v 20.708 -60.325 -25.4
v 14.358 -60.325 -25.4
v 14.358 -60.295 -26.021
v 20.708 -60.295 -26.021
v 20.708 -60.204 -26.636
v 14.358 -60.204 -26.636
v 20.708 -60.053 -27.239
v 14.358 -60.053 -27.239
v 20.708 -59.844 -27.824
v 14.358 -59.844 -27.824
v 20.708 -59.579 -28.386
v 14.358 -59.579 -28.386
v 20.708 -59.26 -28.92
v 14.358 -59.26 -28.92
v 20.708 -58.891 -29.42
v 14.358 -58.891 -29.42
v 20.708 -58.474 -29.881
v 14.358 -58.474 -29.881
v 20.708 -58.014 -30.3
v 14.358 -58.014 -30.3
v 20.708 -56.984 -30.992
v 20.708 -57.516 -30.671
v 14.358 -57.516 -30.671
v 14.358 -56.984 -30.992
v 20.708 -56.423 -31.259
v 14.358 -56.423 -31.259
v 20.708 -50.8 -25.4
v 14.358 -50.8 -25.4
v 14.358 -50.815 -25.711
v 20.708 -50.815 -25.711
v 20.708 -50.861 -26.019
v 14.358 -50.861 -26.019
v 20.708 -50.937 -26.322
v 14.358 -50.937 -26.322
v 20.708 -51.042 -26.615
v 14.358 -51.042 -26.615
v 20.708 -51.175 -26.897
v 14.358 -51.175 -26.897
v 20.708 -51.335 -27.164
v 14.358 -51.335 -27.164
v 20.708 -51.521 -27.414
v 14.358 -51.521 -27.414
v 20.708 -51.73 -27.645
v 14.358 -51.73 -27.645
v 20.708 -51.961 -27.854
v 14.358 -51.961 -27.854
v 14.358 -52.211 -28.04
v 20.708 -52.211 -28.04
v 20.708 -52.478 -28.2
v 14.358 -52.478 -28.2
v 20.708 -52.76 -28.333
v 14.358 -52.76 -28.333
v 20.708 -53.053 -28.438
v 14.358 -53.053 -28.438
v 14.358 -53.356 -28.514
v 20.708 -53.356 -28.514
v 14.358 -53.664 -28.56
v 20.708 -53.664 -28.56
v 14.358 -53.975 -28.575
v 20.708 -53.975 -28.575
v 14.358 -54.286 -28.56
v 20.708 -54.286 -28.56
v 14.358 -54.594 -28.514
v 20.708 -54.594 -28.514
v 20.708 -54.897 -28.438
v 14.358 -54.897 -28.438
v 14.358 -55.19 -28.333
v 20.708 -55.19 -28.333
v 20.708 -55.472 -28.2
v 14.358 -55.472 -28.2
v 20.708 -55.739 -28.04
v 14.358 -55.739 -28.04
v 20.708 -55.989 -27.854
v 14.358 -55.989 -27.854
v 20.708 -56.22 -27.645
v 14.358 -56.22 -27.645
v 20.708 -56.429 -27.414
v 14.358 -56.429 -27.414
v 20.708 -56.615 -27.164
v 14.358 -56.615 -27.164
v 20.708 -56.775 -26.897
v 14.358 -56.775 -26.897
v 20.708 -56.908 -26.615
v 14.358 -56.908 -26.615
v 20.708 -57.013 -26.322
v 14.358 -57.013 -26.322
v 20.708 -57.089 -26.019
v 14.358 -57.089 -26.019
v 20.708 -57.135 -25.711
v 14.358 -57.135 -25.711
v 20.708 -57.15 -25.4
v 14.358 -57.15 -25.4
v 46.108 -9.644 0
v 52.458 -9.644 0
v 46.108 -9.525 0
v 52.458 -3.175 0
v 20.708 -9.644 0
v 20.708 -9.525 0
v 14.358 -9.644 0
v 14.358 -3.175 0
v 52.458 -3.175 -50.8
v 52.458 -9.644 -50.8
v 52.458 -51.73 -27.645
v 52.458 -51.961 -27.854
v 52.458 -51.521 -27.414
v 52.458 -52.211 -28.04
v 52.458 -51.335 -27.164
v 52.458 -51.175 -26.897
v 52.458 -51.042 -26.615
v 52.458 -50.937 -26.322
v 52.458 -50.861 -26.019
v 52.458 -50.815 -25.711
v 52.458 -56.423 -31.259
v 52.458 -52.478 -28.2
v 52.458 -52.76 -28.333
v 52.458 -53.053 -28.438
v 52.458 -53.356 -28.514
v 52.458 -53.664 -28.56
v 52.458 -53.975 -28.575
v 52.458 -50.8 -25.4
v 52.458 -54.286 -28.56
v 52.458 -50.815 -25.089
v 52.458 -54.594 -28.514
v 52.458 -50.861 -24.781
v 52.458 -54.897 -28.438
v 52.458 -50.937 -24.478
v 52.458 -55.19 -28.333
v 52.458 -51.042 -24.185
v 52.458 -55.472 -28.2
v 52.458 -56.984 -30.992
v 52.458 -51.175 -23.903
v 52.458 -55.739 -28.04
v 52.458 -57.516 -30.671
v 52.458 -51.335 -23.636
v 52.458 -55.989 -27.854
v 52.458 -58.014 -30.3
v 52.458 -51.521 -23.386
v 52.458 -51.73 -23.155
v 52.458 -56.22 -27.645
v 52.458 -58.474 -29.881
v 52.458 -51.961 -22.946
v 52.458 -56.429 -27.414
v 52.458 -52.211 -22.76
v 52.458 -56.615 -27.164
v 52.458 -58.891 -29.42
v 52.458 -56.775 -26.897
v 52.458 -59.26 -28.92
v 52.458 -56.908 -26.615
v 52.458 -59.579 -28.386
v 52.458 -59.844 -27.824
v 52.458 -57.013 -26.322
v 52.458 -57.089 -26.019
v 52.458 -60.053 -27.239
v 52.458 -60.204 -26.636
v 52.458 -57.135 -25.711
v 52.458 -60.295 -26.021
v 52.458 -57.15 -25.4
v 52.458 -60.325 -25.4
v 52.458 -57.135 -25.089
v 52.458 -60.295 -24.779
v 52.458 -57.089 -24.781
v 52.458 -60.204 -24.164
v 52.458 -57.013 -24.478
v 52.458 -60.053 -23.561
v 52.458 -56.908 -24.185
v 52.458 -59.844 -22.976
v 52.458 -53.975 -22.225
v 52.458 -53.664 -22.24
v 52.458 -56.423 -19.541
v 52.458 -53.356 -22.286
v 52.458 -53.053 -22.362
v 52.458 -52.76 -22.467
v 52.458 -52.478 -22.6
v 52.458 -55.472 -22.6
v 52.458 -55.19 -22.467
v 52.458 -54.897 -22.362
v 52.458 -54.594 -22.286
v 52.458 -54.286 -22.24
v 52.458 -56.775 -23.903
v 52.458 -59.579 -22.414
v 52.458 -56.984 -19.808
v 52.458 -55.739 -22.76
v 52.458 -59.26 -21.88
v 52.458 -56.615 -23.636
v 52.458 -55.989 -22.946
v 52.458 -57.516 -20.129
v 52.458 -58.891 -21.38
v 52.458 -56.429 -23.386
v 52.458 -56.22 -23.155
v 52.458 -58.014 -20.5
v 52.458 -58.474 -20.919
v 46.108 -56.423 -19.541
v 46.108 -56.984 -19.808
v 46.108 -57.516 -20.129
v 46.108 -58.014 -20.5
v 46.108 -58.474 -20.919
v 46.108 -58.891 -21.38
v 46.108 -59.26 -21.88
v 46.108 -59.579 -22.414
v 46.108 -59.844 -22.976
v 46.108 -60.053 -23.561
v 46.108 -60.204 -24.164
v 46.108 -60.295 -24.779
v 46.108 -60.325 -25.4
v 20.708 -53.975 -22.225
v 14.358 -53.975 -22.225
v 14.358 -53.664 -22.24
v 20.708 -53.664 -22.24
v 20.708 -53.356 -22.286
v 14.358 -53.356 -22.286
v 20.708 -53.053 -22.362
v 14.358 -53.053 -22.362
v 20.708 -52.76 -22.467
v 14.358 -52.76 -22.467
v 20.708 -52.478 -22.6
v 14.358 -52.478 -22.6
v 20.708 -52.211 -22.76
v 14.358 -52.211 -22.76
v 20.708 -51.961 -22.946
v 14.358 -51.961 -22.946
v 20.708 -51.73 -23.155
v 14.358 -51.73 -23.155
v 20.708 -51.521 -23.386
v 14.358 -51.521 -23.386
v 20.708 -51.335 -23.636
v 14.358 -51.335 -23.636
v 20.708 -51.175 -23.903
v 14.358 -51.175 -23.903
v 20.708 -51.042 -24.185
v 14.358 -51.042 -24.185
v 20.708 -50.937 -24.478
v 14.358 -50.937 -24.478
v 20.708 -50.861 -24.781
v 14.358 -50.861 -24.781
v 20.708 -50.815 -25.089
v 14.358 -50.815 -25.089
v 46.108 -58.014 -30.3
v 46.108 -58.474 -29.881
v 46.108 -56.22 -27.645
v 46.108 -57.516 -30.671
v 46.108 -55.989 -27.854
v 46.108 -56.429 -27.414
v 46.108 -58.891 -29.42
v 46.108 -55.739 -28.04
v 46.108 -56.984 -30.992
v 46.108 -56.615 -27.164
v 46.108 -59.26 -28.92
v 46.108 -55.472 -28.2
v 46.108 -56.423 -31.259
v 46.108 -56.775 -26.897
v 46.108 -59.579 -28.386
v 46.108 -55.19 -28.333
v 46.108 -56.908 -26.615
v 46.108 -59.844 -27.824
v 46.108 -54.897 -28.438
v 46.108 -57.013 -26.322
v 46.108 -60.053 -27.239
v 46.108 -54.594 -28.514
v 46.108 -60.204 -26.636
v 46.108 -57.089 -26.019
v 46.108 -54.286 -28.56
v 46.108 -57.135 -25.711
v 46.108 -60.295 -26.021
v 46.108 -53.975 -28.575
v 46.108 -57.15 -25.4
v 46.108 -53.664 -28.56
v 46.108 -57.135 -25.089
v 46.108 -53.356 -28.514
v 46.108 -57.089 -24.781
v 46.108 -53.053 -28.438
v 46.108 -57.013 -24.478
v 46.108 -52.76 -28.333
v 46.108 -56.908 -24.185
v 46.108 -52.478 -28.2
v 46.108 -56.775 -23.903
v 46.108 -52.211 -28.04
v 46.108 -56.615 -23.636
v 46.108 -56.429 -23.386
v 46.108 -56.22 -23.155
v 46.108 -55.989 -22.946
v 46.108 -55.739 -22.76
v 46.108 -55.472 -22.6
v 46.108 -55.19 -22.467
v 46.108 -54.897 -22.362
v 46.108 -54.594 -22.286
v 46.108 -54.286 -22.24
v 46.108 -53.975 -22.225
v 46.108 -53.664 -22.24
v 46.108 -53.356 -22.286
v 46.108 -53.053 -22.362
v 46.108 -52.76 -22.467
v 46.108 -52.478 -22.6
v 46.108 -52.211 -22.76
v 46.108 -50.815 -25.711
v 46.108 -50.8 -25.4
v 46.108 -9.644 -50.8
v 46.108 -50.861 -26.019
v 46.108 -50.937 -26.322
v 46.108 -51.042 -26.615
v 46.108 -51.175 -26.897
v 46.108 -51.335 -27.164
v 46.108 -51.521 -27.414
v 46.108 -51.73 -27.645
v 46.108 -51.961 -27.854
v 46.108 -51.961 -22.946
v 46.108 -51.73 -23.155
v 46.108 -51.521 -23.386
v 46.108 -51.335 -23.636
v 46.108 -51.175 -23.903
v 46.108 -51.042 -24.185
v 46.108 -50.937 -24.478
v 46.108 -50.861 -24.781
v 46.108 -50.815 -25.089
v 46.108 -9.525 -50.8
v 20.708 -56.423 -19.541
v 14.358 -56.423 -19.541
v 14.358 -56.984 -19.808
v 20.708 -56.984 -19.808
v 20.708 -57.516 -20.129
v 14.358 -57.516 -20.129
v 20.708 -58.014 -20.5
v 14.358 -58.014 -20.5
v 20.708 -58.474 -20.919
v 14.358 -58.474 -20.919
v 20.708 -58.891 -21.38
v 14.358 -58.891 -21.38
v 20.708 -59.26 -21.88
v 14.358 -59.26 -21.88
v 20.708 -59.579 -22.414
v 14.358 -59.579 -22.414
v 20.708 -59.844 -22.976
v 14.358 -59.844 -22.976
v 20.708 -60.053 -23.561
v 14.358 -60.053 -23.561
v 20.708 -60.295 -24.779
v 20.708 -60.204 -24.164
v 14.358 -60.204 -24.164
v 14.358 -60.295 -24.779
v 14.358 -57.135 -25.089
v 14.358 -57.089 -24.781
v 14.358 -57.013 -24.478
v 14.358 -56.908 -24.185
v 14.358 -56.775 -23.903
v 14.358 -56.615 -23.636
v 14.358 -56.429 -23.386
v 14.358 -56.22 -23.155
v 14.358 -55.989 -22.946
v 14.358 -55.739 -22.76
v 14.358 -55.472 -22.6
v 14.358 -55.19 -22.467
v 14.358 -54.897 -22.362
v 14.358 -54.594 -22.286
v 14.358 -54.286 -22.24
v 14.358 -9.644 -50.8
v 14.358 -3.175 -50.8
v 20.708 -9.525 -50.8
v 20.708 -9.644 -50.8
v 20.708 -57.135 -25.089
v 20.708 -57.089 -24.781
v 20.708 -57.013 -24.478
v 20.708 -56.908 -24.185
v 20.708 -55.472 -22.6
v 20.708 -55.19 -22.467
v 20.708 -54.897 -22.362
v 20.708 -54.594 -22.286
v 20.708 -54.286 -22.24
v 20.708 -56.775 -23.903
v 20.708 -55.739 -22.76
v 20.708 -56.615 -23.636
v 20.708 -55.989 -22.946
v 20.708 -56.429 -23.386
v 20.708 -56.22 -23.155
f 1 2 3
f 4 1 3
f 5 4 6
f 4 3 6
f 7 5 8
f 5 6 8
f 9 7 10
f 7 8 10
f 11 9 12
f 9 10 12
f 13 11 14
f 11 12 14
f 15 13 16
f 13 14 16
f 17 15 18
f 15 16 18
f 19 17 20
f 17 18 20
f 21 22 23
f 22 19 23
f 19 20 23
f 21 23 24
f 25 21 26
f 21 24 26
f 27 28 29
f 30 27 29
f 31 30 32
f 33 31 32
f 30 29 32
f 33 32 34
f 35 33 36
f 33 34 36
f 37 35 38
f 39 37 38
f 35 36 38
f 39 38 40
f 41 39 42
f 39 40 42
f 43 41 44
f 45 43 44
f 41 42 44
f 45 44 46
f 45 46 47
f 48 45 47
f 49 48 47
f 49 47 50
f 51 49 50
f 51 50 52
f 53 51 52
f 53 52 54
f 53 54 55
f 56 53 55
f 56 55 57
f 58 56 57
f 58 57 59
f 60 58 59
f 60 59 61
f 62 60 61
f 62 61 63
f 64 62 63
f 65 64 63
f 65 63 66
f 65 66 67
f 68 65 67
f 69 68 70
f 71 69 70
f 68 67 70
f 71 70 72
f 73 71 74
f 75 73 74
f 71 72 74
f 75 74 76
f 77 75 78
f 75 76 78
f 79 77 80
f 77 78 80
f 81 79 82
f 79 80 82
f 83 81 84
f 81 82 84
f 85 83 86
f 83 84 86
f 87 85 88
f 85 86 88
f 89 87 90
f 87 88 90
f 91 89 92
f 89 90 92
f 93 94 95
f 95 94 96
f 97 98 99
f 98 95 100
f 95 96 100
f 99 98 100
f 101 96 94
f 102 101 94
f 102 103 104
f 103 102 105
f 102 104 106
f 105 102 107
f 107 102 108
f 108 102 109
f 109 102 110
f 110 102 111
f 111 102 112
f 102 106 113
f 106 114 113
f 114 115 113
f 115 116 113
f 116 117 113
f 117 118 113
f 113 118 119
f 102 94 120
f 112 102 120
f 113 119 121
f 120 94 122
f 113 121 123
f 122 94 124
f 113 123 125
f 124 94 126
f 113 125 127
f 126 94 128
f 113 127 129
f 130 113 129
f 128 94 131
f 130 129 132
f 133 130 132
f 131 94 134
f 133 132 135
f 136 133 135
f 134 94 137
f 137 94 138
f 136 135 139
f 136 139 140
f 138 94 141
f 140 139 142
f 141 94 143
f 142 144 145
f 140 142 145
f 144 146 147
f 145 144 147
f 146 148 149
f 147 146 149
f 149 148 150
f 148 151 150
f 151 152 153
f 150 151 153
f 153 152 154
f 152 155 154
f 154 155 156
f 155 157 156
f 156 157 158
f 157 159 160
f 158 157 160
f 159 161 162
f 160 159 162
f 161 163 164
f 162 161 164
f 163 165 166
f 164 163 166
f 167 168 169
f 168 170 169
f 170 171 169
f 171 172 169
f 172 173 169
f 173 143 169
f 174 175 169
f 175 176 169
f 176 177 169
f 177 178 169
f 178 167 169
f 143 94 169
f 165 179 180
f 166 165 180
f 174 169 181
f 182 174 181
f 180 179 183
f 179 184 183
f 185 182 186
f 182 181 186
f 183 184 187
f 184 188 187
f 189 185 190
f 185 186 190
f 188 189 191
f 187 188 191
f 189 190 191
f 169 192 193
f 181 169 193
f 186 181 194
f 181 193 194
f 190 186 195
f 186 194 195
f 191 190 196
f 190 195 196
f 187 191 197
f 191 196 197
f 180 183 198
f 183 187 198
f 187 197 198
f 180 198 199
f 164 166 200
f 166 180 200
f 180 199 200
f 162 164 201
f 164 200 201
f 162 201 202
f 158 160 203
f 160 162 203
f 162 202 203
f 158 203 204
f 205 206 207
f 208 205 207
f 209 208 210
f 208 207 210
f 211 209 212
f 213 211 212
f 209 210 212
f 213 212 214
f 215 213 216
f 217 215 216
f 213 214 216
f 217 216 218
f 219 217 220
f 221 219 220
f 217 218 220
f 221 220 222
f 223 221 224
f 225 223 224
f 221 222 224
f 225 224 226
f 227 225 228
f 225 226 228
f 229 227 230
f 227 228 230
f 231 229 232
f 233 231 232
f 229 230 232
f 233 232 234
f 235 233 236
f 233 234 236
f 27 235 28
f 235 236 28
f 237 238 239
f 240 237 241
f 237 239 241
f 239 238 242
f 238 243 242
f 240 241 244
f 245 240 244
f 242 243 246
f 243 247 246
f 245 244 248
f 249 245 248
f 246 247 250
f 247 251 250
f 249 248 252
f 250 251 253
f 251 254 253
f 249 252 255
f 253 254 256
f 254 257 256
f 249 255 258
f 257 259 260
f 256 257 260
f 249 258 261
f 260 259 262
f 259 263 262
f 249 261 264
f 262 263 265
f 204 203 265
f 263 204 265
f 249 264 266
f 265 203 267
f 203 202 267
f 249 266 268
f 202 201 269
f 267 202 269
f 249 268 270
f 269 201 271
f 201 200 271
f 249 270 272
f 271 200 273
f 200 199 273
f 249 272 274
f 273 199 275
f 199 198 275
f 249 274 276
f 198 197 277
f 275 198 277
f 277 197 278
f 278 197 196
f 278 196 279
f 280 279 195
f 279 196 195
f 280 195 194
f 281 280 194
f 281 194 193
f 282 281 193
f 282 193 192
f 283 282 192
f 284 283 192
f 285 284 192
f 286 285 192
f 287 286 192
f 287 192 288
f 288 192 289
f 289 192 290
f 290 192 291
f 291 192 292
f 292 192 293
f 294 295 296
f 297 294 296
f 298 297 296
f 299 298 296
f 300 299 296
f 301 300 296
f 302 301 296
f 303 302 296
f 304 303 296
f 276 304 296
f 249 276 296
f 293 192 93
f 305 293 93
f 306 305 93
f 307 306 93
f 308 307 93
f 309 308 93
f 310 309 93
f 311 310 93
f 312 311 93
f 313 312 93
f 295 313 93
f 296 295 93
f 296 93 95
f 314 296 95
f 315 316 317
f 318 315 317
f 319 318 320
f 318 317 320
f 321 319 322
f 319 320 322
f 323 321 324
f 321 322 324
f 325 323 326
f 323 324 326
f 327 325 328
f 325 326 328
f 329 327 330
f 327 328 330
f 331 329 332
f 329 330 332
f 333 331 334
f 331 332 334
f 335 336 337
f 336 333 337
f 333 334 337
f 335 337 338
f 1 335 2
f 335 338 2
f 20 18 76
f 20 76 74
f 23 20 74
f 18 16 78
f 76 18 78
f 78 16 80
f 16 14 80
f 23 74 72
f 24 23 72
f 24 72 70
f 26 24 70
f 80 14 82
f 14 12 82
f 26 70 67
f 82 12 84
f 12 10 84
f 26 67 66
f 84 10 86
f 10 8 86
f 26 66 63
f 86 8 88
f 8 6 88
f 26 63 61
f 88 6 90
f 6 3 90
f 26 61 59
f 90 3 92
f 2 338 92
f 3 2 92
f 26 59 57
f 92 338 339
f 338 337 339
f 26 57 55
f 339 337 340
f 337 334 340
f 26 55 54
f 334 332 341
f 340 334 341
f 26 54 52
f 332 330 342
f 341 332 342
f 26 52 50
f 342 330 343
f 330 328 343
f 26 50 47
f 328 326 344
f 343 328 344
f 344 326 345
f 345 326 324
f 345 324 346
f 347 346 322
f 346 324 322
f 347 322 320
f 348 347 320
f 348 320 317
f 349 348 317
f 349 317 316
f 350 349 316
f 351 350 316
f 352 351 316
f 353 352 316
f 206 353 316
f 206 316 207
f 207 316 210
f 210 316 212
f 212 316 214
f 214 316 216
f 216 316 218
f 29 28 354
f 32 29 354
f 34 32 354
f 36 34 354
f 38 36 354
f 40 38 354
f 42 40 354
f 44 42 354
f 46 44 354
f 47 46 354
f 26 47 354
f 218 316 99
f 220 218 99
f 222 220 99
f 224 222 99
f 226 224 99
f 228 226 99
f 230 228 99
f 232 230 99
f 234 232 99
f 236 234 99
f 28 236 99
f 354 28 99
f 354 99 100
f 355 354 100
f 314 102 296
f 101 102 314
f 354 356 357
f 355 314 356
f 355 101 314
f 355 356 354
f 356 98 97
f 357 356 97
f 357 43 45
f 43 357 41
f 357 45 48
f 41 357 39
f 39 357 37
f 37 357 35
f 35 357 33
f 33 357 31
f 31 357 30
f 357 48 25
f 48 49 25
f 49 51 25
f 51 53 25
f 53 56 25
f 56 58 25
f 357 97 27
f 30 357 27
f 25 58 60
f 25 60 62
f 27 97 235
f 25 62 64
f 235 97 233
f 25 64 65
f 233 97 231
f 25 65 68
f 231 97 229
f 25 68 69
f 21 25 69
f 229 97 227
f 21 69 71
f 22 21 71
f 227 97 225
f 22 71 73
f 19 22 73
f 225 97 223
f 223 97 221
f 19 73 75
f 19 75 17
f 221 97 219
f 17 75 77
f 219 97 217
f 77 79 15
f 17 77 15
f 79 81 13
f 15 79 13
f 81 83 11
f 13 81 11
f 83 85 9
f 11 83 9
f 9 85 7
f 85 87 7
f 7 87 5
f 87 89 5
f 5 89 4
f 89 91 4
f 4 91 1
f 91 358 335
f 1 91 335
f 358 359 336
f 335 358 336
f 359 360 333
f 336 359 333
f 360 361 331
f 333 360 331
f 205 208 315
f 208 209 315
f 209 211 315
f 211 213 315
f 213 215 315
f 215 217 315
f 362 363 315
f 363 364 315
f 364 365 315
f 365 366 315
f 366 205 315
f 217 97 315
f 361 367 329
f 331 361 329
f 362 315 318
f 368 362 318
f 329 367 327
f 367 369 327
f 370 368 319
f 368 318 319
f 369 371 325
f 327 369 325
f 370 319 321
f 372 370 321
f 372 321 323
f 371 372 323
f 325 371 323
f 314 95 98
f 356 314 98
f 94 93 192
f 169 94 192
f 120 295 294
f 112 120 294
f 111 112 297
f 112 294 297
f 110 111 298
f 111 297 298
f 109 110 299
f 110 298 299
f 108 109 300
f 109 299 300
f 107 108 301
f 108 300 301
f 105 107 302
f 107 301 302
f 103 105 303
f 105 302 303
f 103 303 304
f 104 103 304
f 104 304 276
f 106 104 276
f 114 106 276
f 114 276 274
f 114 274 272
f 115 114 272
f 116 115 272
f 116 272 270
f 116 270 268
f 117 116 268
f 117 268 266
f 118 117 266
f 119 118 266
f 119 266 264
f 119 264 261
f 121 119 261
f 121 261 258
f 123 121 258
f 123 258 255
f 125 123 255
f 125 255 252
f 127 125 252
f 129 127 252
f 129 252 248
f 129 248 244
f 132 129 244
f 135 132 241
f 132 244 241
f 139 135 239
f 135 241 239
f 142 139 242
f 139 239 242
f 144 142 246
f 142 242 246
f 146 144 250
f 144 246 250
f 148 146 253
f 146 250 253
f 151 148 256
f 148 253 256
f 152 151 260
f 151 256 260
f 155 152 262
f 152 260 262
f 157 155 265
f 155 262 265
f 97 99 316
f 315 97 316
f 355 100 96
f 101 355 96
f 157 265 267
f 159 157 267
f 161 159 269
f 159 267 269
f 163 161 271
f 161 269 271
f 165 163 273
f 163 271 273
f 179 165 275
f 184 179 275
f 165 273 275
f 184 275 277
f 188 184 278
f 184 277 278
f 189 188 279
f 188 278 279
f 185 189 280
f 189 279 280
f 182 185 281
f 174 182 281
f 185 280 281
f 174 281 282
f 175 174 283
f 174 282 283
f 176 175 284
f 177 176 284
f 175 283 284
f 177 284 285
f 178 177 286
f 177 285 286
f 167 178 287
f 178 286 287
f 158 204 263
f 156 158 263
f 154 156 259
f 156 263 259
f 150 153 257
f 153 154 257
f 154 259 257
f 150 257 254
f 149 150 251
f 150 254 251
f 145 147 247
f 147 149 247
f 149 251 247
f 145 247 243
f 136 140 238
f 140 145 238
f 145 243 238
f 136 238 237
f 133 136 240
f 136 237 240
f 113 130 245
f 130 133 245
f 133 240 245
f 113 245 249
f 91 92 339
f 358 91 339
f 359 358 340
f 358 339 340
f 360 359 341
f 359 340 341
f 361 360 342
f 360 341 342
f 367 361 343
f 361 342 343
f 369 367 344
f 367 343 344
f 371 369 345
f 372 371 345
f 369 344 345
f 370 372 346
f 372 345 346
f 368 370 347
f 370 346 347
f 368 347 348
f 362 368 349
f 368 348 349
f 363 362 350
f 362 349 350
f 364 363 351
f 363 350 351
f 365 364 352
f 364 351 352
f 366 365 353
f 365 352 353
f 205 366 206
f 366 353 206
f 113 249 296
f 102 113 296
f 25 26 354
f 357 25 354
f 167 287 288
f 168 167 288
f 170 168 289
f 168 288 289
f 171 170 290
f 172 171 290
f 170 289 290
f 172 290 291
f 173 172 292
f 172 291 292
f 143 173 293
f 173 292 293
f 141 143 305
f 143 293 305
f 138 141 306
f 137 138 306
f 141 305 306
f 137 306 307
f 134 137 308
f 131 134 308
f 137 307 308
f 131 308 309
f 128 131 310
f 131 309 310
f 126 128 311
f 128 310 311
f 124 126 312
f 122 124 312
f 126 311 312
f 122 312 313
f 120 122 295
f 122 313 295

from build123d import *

# Parameters (mm, degrees)
BOSS_EXTRUDE1_DEPTH = 50.8
CUT_EXTRUDE1_REACH  = 89.586


with BuildPart() as part:
    # Sketch1 → Boss-Extrude1 (new body)
    with BuildSketch(Plane.XY):
        Polygon((52.45808334, -3.175), (52.45808334, -60.325), (46.10808334, -60.325), (46.10808334, -9.525), (20.70808334, -9.525), (20.70808334, -60.325), (14.35808334, -60.325), (14.35808334, -3.175), align=None)
    extrude(amount=-BOSS_EXTRUDE1_DEPTH)

    # Cut-Extrude1: up to this face of the body (flat: up to its plane)
    cut_extrude1_end = Plane(part.part.faces().sort_by_distance((52.45808334, -31.75, -25.4))[0])
    # Sketch2 → Cut-Extrude1 (cut, up to the picked face)
    with BuildSketch(Plane.ZY.offset(-14.35808334), mode=Mode.PRIVATE) as cut_extrude1_sk1:
        with BuildLine():
            ThreePointArc((-22.225, -53.975), (-23.15493597, -51.72993597), (-25.4, -50.8))
            Line((-25.4, -50.8), (-25.4, -57.15))
            ThreePointArc((-25.4, -57.15), (-23.15493597, -56.22006403), (-22.225, -53.975))
        make_face()
    cut_extrude1_tool1 = split(extrude(cut_extrude1_sk1.sketch, amount=-CUT_EXTRUDE1_REACH, mode=Mode.PRIVATE), bisect_by=cut_extrude1_end, keep=Keep.BOTH, mode=Mode.PRIVATE)
    # Sketch2 → Cut-Extrude1 (cut, up to the picked face)
    with BuildSketch(Plane.ZY.offset(-14.35808334), mode=Mode.PRIVATE) as cut_extrude1_sk2:
        with BuildLine():
            Line((-25.4, -57.15), (-25.4, -50.8))
            ThreePointArc((-25.4, -50.8), (-28.575, -53.975), (-25.4, -57.15))
        make_face()
    cut_extrude1_tool2 = split(extrude(cut_extrude1_sk2.sketch, amount=-CUT_EXTRUDE1_REACH, mode=Mode.PRIVATE), bisect_by=cut_extrude1_end, keep=Keep.BOTH, mode=Mode.PRIVATE)
    # Sketch2 → Cut-Extrude1 (cut, up to the picked face)
    with BuildSketch(Plane.ZY.offset(-14.35808334), mode=Mode.PRIVATE) as cut_extrude1_sk3:
        with BuildLine():
            ThreePointArc((-22.225, -53.975), (-23.15493597, -51.72993597), (-25.4, -50.8))
            Line((-25.4, -50.8), (-25.4, -57.15))
            ThreePointArc((-25.4, -57.15), (-23.15493597, -56.22006403), (-22.225, -53.975))
        make_face()
    cut_extrude1_tool3 = split(extrude(cut_extrude1_sk3.sketch, amount=-CUT_EXTRUDE1_REACH, mode=Mode.PRIVATE), bisect_by=cut_extrude1_end, keep=Keep.BOTH, mode=Mode.PRIVATE)
    # Sketch2 → Cut-Extrude1 (cut, up to the picked face)
    with BuildSketch(Plane.ZY.offset(-14.35808334), mode=Mode.PRIVATE) as cut_extrude1_sk4:
        with BuildLine():
            Line((-25.4, -57.15), (-25.4, -50.8))
            ThreePointArc((-25.4, -50.8), (-28.575, -53.975), (-25.4, -57.15))
        make_face()
    cut_extrude1_tool4 = split(extrude(cut_extrude1_sk4.sketch, amount=-CUT_EXTRUDE1_REACH, mode=Mode.PRIVATE), bisect_by=cut_extrude1_end, keep=Keep.BOTH, mode=Mode.PRIVATE)
    # Sketch2 → Cut-Extrude1 (cut, up to the picked face)
    with BuildSketch(Plane.ZY.offset(-14.35808334), mode=Mode.PRIVATE) as cut_extrude1_sk5:
        with BuildLine():
            Line((0, -9.643805147), (-19.540665388, -56.422590224))
            ThreePointArc((-19.540665388, -56.422590224), (-21.880035364, -59.260106334), (-25.4, -60.325))
            Line((-25.4, -60.325), (0, -60.325))
            Line((0, -60.325), (0, -9.643805147))
        make_face()
    cut_extrude1_tool5 = split(extrude(cut_extrude1_sk5.sketch, amount=-CUT_EXTRUDE1_REACH, mode=Mode.PRIVATE), bisect_by=cut_extrude1_end, keep=Keep.BOTH, mode=Mode.PRIVATE)
    # Sketch2 → Cut-Extrude1 (cut, up to the picked face)
    with BuildSketch(Plane.ZY.offset(-14.35808334), mode=Mode.PRIVATE) as cut_extrude1_sk6:
        with BuildLine():
            ThreePointArc((-25.4, -60.325), (-28.919964636, -59.260106334), (-31.259334612, -56.422590224))
            Line((-31.259334612, -56.422590224), (-50.8, -9.643805147))
            Line((-50.8, -9.643805147), (-50.8, -60.325))
            Line((-50.8, -60.325), (-25.4, -60.325))
        make_face()
    cut_extrude1_tool6 = split(extrude(cut_extrude1_sk6.sketch, amount=-CUT_EXTRUDE1_REACH, mode=Mode.PRIVATE), bisect_by=cut_extrude1_end, keep=Keep.BOTH, mode=Mode.PRIVATE)
    add(cut_extrude1_tool1.solids().sort_by(Axis((14.358083, -53.975, -24.052488), (1, 0, 0)))[0], mode=Mode.SUBTRACT)
    add(cut_extrude1_tool2.solids().sort_by(Axis((14.358083, -53.975, -26.747512), (1, 0, 0)))[0], mode=Mode.SUBTRACT)
    add(cut_extrude1_tool3.solids().sort_by(Axis((14.358083, -53.975, -24.052488), (1, 0, 0)))[0], mode=Mode.SUBTRACT)
    add(cut_extrude1_tool4.solids().sort_by(Axis((14.358083, -53.975, -26.747512), (1, 0, 0)))[0], mode=Mode.SUBTRACT)
    add(cut_extrude1_tool5.solids().sort_by(Axis((14.358083, -43.525452, -7.142919), (1, 0, 0)))[0], mode=Mode.SUBTRACT)
    add(cut_extrude1_tool6.solids().sort_by(Axis((14.358083, -43.525452, -43.657081), (1, 0, 0)))[0], mode=Mode.SUBTRACT)


solid = part.part
